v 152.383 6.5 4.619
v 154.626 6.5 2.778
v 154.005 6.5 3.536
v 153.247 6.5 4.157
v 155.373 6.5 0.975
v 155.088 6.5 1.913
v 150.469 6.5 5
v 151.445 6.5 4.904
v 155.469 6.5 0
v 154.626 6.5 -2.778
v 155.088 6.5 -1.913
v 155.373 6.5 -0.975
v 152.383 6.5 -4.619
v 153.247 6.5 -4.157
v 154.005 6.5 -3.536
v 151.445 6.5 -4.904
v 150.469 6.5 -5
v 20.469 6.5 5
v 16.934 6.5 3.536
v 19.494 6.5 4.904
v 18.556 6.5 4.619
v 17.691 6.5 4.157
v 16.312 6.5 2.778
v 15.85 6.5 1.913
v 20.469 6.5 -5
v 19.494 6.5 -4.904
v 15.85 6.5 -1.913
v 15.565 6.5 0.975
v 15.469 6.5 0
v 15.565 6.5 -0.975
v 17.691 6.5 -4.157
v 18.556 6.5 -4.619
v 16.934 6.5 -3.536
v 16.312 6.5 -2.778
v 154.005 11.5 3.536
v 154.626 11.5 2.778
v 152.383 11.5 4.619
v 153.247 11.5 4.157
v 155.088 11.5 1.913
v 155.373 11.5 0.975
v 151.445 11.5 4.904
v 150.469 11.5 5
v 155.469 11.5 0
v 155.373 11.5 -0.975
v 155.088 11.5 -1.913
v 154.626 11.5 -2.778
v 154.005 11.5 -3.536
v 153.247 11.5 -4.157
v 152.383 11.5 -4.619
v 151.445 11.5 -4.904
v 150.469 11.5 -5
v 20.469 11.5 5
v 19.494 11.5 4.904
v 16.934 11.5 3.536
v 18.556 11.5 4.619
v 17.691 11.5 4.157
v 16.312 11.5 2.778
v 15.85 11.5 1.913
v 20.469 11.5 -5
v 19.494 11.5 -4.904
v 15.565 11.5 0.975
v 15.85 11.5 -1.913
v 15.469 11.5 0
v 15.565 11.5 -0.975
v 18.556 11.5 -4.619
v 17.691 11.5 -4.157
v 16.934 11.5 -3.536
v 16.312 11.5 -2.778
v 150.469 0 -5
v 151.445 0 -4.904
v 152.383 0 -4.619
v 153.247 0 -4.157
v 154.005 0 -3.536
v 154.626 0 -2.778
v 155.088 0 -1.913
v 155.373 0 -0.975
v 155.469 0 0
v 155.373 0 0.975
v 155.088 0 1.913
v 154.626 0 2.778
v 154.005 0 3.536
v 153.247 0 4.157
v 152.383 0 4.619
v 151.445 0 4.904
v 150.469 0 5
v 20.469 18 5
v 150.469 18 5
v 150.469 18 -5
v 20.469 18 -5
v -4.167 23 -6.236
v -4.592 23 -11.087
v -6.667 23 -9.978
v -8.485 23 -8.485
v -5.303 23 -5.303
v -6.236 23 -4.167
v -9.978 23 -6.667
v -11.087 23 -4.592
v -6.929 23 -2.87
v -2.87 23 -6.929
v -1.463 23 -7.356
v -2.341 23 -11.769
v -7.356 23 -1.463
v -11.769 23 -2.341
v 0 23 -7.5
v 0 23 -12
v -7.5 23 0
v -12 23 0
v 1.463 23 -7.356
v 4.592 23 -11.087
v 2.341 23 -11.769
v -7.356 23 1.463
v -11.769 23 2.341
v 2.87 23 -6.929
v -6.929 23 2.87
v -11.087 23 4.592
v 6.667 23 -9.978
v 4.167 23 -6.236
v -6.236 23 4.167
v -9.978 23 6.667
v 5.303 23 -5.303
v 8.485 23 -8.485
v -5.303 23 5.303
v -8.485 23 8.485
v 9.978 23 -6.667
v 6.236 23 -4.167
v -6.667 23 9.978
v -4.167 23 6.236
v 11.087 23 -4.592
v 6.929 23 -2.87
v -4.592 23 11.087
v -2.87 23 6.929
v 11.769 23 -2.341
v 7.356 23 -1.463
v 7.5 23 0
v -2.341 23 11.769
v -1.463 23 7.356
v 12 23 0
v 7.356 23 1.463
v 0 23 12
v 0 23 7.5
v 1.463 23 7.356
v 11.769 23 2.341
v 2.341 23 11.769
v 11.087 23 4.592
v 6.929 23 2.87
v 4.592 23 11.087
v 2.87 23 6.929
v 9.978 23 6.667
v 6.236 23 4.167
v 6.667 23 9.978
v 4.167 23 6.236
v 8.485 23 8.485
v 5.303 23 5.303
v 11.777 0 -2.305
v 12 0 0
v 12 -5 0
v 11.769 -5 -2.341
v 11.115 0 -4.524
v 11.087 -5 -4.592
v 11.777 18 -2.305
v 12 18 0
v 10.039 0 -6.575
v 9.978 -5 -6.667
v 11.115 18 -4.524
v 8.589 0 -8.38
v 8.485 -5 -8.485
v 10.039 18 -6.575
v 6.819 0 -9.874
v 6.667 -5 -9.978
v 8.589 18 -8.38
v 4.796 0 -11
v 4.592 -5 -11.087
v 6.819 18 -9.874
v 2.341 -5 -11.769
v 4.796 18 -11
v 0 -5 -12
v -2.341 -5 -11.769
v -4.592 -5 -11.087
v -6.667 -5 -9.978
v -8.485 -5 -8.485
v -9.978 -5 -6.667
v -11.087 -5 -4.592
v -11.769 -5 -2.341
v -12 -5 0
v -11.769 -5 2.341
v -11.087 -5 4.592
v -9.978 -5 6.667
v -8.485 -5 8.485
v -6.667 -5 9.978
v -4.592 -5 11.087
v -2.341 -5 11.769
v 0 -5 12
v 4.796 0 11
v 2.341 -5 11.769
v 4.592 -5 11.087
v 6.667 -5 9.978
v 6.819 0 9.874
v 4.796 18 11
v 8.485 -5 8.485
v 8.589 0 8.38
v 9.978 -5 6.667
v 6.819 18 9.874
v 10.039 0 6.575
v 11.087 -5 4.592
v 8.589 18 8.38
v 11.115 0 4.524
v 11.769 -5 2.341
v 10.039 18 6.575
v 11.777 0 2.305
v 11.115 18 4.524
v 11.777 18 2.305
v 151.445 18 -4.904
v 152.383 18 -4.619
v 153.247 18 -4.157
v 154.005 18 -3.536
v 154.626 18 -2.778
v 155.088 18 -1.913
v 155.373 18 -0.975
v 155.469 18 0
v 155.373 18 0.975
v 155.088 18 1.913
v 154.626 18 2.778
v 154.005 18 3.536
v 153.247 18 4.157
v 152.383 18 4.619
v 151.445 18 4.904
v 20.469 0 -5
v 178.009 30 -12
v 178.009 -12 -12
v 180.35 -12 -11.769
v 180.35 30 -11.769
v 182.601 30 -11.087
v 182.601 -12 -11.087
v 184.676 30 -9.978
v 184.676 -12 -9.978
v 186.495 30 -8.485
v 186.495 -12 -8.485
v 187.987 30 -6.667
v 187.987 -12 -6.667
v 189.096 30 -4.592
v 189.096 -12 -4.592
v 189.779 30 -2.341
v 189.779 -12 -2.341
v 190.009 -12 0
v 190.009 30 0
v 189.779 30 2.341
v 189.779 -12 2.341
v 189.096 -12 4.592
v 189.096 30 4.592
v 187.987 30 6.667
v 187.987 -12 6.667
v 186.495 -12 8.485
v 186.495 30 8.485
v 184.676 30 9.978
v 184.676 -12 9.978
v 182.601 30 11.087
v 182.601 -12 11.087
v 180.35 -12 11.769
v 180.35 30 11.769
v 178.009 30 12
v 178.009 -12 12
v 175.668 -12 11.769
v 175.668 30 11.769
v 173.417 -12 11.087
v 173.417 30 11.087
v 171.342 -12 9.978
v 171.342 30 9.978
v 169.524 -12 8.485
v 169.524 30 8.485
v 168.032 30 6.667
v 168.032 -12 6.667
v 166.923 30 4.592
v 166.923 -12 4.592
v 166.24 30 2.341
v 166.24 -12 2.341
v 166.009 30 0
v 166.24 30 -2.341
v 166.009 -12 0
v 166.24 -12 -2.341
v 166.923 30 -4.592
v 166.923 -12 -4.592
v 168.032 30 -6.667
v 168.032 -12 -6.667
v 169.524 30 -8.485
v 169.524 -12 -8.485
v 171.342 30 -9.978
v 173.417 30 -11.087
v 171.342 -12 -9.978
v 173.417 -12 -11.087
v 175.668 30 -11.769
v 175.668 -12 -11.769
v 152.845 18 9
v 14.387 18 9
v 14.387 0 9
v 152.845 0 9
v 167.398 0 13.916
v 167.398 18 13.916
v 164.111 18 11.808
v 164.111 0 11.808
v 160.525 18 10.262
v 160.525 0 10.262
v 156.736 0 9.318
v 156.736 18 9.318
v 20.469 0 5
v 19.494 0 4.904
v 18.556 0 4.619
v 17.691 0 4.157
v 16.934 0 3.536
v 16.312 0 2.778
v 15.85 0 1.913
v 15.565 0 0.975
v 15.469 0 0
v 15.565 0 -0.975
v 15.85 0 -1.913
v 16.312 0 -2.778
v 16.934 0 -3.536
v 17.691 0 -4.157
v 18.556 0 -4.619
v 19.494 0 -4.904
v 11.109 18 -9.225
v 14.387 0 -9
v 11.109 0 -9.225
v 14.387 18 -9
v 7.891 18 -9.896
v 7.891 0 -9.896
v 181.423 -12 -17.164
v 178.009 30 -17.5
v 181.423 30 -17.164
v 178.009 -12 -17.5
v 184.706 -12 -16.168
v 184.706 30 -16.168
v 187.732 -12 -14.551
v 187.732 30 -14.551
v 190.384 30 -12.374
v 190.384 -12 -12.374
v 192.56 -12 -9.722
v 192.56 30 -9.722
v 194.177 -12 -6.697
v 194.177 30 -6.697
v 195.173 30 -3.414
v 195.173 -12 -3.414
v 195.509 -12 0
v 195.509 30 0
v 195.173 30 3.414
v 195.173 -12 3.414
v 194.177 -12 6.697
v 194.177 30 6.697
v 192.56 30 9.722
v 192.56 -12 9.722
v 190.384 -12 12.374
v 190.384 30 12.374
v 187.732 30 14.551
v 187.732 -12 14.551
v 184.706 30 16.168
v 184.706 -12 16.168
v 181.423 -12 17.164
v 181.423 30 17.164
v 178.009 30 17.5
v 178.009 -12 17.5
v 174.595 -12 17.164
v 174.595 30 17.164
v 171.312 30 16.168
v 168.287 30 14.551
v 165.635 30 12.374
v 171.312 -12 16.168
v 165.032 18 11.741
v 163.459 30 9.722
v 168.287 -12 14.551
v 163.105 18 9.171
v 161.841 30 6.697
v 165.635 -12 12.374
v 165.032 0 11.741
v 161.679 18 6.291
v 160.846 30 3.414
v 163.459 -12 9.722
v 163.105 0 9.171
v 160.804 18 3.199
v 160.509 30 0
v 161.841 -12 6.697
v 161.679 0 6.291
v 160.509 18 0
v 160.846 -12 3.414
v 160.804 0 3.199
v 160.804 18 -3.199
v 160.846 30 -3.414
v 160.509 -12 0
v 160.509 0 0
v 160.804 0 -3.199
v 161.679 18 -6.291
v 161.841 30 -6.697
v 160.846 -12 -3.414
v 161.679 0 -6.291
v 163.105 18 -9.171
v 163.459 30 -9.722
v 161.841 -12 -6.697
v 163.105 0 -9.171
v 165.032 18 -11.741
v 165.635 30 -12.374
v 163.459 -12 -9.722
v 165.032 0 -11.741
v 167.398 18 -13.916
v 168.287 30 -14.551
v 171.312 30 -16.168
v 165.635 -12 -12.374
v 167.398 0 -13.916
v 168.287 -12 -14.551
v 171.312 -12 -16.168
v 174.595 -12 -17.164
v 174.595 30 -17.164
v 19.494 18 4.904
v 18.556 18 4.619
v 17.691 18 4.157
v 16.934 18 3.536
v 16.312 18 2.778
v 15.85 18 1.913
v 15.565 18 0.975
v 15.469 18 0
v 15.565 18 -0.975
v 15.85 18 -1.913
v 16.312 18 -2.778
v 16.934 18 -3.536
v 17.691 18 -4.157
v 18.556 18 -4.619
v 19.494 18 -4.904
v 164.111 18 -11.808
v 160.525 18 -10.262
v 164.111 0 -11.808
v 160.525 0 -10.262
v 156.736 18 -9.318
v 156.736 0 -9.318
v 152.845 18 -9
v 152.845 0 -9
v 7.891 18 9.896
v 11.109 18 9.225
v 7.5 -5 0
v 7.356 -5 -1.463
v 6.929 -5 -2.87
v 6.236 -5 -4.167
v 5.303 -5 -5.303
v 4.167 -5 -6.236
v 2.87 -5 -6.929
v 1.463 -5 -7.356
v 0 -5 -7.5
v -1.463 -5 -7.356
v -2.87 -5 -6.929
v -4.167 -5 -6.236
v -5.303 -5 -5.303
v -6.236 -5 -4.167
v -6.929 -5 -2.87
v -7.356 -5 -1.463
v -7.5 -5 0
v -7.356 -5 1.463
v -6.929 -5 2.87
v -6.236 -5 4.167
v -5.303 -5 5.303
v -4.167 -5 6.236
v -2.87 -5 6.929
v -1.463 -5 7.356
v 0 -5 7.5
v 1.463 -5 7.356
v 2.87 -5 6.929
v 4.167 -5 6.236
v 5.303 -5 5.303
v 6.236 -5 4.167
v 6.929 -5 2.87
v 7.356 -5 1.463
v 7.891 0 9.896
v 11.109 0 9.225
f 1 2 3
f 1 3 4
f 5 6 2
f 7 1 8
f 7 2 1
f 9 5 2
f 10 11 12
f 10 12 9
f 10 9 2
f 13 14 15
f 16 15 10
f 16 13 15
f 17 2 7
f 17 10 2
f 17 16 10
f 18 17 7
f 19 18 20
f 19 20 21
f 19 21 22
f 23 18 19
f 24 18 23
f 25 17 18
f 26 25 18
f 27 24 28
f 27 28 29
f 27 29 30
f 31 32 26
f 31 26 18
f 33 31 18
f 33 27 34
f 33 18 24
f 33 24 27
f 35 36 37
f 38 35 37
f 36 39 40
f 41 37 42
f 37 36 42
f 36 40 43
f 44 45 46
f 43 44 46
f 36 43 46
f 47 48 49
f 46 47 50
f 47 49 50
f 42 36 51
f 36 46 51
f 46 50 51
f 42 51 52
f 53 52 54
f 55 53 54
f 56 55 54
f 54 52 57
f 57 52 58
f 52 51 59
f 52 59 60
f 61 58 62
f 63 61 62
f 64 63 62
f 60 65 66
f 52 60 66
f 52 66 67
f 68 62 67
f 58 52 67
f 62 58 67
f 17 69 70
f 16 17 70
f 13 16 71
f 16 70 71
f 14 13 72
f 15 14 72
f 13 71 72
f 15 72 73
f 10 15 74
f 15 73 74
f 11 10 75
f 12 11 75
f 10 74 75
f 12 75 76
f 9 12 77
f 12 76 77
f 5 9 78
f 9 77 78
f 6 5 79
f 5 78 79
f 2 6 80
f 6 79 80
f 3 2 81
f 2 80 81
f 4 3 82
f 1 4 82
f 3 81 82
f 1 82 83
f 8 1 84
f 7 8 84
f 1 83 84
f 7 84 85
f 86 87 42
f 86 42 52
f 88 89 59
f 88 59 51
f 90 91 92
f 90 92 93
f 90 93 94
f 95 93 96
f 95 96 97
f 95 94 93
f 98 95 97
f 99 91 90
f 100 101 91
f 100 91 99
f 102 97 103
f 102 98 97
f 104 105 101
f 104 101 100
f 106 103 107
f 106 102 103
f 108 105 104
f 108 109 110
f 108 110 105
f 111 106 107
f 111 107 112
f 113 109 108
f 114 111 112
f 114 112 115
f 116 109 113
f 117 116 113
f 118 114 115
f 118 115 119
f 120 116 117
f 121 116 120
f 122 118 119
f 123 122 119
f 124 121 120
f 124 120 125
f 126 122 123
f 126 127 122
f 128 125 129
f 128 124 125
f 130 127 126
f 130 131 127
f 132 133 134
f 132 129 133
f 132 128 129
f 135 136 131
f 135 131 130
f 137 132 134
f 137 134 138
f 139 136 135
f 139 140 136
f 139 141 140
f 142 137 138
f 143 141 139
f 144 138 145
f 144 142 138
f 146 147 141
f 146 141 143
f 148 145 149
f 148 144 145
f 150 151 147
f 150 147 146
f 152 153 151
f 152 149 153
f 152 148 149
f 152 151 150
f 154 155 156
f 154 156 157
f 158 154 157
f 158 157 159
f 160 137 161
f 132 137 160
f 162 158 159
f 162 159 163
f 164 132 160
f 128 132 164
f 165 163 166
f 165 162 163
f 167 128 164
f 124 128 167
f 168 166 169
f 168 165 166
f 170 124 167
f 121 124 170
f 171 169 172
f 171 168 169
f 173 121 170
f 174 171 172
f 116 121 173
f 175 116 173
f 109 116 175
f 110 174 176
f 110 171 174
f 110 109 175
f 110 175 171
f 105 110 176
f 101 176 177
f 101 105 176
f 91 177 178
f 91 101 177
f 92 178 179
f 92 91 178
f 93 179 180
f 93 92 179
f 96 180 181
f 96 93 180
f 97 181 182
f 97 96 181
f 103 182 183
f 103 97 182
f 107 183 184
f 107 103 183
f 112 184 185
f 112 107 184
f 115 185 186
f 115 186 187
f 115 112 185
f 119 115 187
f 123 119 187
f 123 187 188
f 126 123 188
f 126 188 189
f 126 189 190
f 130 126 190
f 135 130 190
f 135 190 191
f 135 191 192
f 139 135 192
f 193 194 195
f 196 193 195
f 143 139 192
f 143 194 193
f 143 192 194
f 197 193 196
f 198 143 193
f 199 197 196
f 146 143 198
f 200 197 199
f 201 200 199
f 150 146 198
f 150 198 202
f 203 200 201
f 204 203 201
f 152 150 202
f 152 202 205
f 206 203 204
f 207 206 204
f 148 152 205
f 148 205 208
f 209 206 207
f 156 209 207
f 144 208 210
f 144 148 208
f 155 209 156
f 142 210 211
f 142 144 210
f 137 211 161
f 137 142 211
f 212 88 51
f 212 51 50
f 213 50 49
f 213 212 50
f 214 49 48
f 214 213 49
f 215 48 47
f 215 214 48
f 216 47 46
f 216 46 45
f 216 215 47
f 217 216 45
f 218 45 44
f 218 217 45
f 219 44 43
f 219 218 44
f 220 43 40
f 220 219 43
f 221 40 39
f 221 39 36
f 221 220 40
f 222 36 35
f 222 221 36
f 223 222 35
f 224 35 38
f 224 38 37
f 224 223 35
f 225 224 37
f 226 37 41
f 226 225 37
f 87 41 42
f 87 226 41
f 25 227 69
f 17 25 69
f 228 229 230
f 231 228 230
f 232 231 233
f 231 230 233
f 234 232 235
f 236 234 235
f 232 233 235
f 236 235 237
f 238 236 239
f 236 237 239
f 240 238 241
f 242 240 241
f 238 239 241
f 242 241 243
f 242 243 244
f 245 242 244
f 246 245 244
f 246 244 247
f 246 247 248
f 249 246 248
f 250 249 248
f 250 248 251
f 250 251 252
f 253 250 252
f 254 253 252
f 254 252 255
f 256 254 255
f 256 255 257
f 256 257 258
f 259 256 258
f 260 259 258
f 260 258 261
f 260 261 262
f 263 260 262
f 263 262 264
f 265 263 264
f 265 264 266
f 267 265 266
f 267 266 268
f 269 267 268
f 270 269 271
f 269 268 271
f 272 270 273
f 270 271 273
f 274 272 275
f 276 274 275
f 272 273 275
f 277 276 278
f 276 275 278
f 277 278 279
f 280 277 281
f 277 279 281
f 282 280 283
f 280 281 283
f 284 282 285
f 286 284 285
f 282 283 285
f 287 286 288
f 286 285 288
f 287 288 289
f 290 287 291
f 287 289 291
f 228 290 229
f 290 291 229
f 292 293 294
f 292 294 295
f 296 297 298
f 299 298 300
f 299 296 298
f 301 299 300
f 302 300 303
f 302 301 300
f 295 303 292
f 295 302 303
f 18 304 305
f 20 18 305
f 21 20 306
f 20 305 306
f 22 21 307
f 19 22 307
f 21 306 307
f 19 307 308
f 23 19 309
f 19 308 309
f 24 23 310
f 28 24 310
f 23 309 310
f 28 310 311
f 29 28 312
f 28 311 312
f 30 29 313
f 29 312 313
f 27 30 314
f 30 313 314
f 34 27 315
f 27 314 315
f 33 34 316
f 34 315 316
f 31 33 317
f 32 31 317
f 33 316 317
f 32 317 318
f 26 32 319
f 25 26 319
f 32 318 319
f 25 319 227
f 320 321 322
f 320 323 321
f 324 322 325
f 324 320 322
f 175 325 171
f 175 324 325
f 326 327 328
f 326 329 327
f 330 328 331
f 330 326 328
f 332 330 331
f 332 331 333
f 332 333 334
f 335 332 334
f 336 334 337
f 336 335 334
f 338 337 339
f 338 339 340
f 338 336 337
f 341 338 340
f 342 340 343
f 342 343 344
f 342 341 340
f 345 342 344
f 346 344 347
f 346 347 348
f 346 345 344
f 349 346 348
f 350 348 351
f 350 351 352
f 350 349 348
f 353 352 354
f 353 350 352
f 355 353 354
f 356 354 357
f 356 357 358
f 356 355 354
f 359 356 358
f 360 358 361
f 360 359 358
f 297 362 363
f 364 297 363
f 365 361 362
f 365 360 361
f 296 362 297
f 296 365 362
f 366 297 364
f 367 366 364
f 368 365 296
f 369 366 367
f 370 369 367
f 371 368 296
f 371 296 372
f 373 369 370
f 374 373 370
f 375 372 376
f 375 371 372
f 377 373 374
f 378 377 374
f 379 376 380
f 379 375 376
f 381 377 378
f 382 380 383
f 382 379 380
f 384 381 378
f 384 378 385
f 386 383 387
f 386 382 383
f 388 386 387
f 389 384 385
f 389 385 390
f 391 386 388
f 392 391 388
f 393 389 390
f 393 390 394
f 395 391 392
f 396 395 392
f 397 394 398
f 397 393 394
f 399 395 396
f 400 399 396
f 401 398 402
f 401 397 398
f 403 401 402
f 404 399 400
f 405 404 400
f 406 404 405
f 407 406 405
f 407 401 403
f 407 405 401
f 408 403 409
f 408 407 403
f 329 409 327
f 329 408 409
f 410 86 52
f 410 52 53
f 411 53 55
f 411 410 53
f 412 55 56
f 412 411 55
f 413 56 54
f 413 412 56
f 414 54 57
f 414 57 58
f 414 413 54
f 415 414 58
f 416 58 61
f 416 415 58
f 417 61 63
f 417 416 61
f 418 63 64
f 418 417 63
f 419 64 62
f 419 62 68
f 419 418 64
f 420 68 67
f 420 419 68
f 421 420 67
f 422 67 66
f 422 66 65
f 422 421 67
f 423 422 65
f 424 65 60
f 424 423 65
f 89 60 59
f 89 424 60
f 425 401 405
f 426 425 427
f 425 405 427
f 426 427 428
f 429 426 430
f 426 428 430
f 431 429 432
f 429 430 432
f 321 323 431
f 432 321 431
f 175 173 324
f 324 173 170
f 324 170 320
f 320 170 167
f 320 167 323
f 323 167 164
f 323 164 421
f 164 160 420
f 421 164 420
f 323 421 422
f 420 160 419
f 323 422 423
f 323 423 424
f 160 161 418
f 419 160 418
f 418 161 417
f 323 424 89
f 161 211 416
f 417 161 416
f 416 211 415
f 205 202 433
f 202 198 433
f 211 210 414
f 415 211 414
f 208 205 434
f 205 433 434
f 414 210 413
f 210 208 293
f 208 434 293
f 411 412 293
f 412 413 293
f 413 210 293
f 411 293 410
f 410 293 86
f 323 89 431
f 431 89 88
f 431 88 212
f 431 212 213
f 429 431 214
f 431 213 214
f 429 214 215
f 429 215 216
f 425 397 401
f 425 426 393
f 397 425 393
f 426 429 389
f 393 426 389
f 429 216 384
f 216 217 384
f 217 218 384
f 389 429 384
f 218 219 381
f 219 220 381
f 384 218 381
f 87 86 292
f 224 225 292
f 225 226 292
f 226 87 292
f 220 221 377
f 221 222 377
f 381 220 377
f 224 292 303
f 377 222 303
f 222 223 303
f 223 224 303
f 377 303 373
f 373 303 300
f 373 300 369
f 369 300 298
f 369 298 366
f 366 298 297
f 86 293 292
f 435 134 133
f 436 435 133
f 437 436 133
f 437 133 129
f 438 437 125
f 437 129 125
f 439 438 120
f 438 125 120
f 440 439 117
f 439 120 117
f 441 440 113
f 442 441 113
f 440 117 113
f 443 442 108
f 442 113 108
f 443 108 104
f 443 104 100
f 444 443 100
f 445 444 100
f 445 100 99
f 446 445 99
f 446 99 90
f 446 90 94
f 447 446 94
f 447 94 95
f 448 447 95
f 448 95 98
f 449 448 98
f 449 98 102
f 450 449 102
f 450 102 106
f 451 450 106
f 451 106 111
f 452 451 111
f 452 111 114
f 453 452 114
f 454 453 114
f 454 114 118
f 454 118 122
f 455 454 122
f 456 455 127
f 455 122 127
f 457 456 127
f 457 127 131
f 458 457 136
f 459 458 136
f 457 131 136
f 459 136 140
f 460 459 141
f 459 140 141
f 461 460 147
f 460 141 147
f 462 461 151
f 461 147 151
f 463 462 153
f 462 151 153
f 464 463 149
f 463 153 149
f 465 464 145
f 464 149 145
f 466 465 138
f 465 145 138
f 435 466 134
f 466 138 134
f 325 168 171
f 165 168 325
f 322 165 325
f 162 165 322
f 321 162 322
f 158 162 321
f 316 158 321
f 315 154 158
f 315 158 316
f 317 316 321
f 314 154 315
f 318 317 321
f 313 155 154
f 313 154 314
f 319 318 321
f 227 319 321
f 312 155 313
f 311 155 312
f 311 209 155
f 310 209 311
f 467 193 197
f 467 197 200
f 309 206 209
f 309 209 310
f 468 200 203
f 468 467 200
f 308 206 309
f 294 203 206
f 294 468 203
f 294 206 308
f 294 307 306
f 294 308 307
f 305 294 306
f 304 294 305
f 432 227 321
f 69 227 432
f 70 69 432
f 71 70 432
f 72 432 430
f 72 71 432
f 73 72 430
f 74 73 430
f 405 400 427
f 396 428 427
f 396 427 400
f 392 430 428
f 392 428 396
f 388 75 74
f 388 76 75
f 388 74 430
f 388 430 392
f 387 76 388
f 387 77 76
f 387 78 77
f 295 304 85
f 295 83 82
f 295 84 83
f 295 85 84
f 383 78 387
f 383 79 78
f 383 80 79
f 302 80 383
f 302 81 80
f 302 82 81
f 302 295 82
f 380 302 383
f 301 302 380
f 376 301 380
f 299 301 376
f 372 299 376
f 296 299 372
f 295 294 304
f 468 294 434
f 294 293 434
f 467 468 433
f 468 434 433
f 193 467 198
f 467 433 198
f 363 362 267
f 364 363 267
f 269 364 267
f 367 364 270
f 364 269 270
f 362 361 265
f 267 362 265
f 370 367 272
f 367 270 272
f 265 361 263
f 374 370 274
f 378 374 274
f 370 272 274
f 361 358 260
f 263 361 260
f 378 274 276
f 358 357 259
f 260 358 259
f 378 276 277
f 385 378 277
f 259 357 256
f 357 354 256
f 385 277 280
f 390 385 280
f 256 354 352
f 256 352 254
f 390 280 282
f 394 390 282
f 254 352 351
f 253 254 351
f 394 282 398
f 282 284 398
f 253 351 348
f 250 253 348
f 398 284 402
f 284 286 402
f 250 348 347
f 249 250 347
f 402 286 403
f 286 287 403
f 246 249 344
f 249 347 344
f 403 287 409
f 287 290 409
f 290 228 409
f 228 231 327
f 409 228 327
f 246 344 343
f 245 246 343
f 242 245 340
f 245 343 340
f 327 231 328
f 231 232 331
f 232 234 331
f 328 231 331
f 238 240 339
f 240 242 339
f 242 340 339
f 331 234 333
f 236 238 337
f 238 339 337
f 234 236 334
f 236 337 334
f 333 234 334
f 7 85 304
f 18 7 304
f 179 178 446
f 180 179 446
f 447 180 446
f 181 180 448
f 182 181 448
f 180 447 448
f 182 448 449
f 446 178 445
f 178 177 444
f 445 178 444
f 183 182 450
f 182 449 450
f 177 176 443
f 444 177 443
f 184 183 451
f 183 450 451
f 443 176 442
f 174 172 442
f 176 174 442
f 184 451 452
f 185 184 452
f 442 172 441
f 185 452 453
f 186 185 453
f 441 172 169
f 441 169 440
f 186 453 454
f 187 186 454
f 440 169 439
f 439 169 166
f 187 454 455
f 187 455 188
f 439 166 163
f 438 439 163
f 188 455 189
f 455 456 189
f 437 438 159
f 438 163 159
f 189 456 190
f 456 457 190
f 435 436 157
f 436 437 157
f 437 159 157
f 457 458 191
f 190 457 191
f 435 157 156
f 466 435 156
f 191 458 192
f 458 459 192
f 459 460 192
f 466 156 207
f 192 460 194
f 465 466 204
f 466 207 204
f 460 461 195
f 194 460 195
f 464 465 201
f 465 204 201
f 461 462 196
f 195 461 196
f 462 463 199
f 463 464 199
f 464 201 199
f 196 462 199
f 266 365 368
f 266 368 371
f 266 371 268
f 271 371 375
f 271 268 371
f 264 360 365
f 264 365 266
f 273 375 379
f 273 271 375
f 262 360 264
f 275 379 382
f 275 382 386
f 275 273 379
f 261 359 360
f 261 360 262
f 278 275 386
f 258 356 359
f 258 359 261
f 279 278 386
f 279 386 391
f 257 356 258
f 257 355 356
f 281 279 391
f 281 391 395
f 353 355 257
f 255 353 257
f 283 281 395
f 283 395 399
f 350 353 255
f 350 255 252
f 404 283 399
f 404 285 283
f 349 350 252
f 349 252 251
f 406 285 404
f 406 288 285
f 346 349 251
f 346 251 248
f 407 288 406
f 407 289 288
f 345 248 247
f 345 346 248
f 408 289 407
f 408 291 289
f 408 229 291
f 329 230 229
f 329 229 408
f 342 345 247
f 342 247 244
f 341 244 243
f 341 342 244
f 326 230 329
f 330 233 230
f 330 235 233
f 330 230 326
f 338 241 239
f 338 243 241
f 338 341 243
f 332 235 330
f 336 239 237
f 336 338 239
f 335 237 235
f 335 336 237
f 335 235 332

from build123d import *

# Parameters (mm, degrees)
SKETCH2_W            = 178
SKETCH2_H            = 18
BOSS_EXTRUDE1_DEPTH  = 9
SWEEP2_PROFILE_R     = 12
SWEEP3_PROFILE_R     = 17.5
CUT_EXTRUDE1_DEPTH   = 6.5
CUT_SWEEP1_PROFILE_R = 7.5
CUT_SWEEP2_PROFILE_R = 12
FILLET1_R            = 24


with BuildPart() as part:
    # Sketch2 → Boss-Extrude1 (new body, symmetric)
    with BuildSketch(Plane.XY):
        with Locations((89, 9)):
            Rectangle(SKETCH2_W, SKETCH2_H)
    extrude(amount=BOSS_EXTRUDE1_DEPTH, both=True)

    # Sweep2: sweep along a path in Sketch11
    with BuildLine(Plane.XY) as sweep2_path:
        Line((0, -5), (0, 23))
    # Sweep2 profile (on start of the path) → Sweep2 (sweep)
    with BuildSketch(Plane(origin=(0, -5, 0), x_dir=(1, 0, 0), z_dir=(0, 1, 0))):
        Circle(SWEEP2_PROFILE_R)
    sweep(path=sweep2_path.line)

    # Sweep3: sweep along a path in Sketch18
    with BuildLine(Plane.XY) as sweep3_path:
        Line((178.00925882, 30), (178.00925882, -12))
    # Sweep3 profile (on start of the path) → Sweep3 (sweep)
    with BuildSketch(Plane(origin=(178.00925882, 30, 0), x_dir=(0, 0, -1), z_dir=(0, -1, 0))):
        Circle(SWEEP3_PROFILE_R)
    sweep(path=sweep3_path.line)

    # Sketch25 → Cut-Extrude1 (cut)
    with BuildSketch(Plane(origin=(0, 18, 0), x_dir=(1, 0, 0), z_dir=(0, 1, 0))):
        with BuildLine():
            Line((20.469090867, 5), (150.469090867, 5))
            ThreePointArc((150.469090867, 5), (155.469090867, 0), (150.469090867, -5))
            Line((150.469090867, -5), (20.469090867, -5))
            ThreePointArc((20.469090867, -5), (15.469090867, 0), (20.469090867, 5))
        make_face()
    cut_extrude1 = extrude(amount=-CUT_EXTRUDE1_DEPTH, mode=Mode.SUBTRACT)

    # Mirror1: Cut-Extrude1 across plane
    add(cut_extrude1.mirror(Plane.ZX.offset(9)), mode=Mode.SUBTRACT)

    # Cut-Sweep1: sweep along a path in Sketch11<2>
    with BuildLine(Plane.XY) as cut_sweep1_path:
        Line((0, -5), (0, 23))
    # Cut-Sweep1 profile (on start of the path) → Cut-Sweep1 (sweep, cut)
    with BuildSketch(Plane(origin=(0, -5, 0), x_dir=(1, 0, 0), z_dir=(0, 1, 0))):
        Circle(CUT_SWEEP1_PROFILE_R)
    sweep(path=cut_sweep1_path.line, mode=Mode.SUBTRACT)

    # Cut-Sweep2: sweep along a path in Sketch18<2>
    with BuildLine(Plane.XY) as cut_sweep2_path:
        Line((178.00925882, 30), (178.00925882, -12))
    # Cut-Sweep2 profile (on start of the path) → Cut-Sweep2 (sweep, cut)
    with BuildSketch(Plane(origin=(178.00925882, 30, 0), x_dir=(0, 0, -1), z_dir=(0, -1, 0))):
        Circle(CUT_SWEEP2_PROFILE_R)
    sweep(path=cut_sweep2_path.line, mode=Mode.SUBTRACT)

    # Fillet1
    fillet1_edges = [part.edges().sort_by_distance(p)[0] for p in [
        (7.937253933, 9, -9),
        (7.937253933, 9, 9),
        (163.0009278, 9, -9),
        (163.0009278, 9, 9),
    ]]
    fillet(fillet1_edges, radius=FILLET1_R)


solid = part.part
